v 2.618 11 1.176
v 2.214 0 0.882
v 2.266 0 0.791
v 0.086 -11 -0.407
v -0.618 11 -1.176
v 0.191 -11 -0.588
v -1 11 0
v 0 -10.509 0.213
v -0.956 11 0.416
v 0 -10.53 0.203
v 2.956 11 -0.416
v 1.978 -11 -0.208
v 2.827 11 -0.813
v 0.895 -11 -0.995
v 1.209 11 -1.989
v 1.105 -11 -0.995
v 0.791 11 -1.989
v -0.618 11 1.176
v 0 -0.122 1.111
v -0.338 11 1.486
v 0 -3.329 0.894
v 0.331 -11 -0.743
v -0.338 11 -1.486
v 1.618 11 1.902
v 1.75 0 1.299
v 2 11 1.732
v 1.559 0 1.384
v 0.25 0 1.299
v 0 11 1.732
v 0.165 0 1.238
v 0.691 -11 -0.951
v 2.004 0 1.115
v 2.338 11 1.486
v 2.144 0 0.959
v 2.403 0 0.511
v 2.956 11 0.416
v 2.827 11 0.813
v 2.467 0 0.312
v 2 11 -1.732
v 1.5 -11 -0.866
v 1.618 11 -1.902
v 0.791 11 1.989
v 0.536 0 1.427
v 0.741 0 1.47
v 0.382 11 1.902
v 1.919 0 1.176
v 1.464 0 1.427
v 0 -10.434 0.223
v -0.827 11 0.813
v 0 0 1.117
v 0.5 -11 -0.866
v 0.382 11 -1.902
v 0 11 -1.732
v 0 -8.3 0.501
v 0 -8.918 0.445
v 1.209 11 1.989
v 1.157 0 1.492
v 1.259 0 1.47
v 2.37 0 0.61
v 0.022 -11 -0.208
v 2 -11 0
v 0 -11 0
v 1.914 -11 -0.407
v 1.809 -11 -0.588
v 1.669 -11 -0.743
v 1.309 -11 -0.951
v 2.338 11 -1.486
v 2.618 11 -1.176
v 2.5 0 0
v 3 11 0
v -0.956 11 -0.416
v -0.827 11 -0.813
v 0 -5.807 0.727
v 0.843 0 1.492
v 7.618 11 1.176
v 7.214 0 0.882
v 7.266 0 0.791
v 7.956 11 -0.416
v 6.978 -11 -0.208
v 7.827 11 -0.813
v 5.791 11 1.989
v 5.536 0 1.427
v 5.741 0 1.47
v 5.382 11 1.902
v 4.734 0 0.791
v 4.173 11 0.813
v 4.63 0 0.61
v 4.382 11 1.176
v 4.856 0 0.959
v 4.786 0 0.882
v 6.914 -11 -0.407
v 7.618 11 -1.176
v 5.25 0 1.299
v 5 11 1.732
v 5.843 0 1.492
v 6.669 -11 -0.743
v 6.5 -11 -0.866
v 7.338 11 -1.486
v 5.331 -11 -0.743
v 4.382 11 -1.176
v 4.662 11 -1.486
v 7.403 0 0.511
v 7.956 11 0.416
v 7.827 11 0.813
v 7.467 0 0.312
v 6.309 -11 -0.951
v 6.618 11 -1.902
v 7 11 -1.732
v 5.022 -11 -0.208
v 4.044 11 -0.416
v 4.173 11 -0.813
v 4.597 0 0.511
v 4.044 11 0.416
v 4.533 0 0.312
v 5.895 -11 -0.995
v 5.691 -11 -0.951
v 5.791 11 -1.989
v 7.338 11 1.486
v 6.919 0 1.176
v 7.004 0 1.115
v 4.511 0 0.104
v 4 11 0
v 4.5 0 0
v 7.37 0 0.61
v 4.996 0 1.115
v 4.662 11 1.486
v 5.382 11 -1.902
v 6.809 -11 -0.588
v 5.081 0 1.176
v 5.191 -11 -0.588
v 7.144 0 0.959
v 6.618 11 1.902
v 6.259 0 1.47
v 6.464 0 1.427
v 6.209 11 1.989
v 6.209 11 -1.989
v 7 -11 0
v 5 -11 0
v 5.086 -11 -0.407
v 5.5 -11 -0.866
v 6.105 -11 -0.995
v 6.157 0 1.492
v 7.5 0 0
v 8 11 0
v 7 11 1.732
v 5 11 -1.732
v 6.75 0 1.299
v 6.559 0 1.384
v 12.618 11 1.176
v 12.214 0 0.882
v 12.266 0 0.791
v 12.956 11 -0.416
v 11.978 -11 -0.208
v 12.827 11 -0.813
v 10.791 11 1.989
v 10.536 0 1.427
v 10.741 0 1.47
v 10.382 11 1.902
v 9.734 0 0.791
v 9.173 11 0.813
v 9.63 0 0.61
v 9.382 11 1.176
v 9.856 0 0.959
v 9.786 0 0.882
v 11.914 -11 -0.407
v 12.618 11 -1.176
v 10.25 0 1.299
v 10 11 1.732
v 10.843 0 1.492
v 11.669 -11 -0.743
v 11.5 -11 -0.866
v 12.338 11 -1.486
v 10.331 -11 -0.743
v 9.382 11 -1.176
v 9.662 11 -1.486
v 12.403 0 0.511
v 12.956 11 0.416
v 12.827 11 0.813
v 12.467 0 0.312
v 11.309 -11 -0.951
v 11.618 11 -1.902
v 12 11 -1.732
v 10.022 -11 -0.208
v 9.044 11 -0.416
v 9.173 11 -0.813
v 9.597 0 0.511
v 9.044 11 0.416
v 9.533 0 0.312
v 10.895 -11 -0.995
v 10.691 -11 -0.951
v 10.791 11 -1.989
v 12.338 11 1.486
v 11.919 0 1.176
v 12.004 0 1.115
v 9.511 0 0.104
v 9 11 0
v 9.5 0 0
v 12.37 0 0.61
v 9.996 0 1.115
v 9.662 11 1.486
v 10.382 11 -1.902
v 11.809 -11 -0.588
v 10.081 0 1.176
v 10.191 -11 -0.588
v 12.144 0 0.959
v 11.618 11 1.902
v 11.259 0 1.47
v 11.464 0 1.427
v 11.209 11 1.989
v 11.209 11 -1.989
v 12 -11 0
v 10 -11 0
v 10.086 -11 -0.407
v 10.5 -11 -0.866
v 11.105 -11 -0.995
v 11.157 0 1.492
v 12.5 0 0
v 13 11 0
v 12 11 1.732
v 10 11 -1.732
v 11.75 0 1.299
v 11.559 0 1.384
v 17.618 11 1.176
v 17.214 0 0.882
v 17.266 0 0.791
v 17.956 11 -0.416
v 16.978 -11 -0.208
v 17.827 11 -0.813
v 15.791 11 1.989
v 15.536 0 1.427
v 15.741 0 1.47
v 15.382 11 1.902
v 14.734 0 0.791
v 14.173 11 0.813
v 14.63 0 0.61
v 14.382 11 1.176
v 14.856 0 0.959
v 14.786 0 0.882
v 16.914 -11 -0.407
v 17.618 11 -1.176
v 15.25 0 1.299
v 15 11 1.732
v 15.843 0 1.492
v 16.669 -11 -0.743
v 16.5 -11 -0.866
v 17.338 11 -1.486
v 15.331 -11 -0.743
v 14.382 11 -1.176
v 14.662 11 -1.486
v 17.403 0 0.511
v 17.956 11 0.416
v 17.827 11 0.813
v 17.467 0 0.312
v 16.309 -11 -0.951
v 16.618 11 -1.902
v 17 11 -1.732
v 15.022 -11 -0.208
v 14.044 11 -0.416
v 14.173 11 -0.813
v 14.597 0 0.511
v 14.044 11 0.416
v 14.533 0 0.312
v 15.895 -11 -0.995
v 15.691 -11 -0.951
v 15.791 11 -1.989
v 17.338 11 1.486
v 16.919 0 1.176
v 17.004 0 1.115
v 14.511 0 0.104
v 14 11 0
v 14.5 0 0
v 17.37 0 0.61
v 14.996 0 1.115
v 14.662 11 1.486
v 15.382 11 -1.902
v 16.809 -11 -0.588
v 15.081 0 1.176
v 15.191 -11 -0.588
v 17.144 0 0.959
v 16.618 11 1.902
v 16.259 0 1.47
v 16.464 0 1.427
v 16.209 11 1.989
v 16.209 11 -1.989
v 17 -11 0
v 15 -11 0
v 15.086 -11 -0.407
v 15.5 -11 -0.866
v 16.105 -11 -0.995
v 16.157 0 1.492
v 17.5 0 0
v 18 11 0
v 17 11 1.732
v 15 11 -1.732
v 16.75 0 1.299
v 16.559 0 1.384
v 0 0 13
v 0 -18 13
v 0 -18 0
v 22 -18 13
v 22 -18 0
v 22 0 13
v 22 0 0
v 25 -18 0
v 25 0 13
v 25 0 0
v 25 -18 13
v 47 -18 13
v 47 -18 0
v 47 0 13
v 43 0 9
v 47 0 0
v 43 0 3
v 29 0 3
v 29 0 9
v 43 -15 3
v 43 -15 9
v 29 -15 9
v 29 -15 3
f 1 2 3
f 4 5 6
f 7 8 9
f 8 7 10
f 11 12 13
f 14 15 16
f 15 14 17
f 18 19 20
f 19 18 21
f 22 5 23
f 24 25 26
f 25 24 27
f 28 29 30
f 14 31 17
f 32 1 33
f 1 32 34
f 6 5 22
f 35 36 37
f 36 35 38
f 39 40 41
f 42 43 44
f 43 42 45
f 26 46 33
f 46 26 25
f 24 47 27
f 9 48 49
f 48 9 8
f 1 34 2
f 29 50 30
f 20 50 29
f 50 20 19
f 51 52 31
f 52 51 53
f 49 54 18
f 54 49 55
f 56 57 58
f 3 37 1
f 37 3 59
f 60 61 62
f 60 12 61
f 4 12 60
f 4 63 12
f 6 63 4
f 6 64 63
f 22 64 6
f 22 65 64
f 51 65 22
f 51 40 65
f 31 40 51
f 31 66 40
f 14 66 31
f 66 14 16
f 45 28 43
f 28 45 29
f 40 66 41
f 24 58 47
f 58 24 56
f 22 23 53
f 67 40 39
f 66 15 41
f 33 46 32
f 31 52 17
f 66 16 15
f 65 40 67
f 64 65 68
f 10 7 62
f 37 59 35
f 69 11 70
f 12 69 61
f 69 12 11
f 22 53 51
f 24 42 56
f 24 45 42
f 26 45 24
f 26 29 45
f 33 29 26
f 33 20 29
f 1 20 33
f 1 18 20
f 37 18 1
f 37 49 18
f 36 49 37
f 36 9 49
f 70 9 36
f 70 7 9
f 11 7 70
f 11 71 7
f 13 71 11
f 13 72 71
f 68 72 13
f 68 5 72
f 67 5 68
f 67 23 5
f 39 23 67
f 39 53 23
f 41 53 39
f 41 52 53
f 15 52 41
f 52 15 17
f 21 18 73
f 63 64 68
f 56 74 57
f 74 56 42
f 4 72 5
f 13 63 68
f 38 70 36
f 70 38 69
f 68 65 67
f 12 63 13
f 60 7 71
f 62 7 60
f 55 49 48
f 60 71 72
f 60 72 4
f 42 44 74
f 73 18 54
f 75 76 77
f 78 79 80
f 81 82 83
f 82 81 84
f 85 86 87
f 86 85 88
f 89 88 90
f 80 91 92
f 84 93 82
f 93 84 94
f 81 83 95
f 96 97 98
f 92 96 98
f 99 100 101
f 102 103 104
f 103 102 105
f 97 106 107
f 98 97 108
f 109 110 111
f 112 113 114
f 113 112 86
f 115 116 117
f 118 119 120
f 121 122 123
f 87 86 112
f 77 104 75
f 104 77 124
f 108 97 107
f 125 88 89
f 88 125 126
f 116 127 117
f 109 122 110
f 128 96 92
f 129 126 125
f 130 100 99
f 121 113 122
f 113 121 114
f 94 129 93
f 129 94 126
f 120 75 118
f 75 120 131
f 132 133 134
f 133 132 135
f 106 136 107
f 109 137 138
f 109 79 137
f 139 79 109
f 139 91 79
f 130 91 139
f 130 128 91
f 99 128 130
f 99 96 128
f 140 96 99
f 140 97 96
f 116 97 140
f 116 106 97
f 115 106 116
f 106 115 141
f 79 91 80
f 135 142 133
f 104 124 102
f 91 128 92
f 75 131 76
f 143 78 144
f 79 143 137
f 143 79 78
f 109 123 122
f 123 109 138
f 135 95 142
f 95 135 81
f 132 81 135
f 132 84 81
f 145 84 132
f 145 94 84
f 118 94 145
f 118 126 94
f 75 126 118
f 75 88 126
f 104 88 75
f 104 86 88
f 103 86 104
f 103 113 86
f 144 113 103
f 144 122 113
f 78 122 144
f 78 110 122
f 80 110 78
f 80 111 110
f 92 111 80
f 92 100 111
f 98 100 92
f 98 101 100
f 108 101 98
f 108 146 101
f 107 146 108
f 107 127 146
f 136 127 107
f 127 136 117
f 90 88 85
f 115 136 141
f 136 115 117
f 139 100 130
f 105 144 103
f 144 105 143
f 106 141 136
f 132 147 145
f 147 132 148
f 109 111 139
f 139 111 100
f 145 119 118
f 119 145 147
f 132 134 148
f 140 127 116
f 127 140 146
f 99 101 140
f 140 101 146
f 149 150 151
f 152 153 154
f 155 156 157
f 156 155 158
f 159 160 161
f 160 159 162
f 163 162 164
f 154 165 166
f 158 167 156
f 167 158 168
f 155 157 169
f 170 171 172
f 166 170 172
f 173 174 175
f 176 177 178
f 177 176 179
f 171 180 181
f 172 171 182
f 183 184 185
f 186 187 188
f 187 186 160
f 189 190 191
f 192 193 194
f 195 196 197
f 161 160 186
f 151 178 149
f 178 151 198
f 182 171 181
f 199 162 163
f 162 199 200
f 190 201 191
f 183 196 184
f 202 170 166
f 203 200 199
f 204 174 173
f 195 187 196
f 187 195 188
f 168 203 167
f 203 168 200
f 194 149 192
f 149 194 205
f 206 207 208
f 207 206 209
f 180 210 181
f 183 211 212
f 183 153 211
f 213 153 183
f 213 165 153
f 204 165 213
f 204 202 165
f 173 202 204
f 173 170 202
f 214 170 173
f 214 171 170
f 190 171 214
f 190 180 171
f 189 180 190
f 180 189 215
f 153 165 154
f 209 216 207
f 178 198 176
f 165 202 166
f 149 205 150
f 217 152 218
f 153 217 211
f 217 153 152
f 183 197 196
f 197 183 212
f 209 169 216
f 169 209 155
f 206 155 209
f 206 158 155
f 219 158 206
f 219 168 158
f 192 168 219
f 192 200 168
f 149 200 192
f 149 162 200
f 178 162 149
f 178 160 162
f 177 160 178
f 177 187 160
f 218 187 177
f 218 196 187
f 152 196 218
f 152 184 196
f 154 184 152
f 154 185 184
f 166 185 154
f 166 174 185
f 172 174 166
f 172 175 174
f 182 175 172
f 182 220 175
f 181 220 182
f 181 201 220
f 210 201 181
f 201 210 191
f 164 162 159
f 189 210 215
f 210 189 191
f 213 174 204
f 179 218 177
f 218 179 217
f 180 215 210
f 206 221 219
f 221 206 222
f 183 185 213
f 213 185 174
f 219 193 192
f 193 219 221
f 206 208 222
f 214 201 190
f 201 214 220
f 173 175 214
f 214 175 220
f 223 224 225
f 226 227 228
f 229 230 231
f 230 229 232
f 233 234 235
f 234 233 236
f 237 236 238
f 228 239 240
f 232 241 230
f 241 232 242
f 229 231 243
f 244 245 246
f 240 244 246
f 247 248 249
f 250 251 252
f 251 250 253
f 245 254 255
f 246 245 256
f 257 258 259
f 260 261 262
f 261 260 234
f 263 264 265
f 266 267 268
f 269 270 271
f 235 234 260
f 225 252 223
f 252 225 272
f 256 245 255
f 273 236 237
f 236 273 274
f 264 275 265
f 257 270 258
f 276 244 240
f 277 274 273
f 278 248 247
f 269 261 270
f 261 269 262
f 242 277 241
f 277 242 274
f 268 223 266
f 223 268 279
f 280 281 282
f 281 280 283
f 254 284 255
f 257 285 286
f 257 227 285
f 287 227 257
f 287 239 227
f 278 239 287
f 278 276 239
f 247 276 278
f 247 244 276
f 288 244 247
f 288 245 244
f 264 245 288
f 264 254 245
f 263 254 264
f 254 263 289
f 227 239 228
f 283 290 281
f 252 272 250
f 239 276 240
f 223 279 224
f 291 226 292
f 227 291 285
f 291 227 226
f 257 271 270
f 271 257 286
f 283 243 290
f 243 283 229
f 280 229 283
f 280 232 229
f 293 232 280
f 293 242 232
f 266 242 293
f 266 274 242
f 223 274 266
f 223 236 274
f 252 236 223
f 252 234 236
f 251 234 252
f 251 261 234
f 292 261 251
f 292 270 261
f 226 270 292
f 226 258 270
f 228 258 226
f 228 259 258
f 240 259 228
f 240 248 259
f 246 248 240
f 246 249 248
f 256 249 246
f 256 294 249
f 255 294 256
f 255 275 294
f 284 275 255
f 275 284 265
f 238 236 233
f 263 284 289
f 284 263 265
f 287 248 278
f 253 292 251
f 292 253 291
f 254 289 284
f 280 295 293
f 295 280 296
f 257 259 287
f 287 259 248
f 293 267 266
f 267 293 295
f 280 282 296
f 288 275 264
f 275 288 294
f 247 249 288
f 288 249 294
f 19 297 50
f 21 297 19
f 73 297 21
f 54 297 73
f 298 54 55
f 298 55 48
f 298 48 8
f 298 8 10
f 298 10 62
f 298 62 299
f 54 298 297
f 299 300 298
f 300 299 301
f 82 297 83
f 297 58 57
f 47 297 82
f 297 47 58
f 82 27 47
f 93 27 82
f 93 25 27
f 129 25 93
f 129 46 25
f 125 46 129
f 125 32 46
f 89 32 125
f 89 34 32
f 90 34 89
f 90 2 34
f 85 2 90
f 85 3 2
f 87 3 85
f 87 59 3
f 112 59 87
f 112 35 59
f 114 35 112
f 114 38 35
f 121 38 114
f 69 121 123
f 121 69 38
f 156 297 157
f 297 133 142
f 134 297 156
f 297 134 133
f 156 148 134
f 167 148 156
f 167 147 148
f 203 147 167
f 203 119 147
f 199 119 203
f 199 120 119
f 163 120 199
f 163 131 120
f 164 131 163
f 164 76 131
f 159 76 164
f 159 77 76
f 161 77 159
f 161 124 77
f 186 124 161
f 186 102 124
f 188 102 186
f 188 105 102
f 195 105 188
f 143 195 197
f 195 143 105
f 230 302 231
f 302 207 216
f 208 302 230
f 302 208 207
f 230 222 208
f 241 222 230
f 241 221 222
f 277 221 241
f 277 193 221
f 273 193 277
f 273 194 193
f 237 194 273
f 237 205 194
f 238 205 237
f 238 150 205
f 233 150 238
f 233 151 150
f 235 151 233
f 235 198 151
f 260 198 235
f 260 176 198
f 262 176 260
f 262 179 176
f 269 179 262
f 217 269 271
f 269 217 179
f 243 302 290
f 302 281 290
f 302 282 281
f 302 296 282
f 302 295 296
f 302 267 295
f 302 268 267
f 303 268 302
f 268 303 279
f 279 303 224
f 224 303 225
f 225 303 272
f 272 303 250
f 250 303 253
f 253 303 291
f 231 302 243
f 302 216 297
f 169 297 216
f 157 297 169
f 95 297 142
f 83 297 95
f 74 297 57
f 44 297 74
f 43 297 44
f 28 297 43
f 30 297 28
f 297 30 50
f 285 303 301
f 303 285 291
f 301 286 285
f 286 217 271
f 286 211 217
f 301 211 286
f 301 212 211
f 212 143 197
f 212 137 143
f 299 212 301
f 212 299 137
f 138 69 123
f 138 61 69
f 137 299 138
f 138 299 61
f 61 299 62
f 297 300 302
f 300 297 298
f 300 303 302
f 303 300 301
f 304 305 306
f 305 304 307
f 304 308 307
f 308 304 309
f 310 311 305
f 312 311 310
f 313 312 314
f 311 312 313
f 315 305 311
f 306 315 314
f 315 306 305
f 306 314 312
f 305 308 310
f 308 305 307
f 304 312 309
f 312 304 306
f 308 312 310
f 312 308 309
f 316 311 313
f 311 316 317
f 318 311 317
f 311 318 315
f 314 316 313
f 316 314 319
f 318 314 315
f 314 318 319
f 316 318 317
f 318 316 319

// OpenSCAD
/*

__________ ____ ___  _____________  __.___.____    .____     
\______   \    |   \/   _____/    |/ _|   |    |   |    |    
 |    |  _/    |   /\_____  \|      < |   |    |   |    |    
 |    |   \    |  / /        \    |  \|   |    |___|    |___ 
 |______  /______/ /_______  /____|__ \___|_______ \_______ \
        \/                 \/        \/           \/       \/


*/
/*                      
Buskill USB-A Magnetic breakaway Shell Assembly     
GNU General Public License v3.0 
Author: Melanie Allen
*/



/*
Description

BusKill is a Dead Man Switch triggered when a magnetic breakaway is tripped, severing a USB connection. This design is for USB-A.

The user will have a USB, a USB extension cable, and the magnetic breakaway. 

The "breakaway" is connected to a USB extension cord that terminates with the female USB port that receives a USB. It is in four parts, the base, two middle pieces, and the lid. It contains 5 pogo pins and 2 magnets. It separates from the release when the cord is pulled. (red)

The "release" is connected to the cord that terminates with the male USB and inserts the computer. It is in three parts, the base, the middle, and the lid. It contains 5 pogo receptors and 2 magnets. (pink)

When the magnets on the breakaway and release connect, the pogo pins and pogo receptors must meet and establish the USB connection.

The breakaway and release plugs must be designed asymmetrically to prevent the connection from happening the wrong way. 

In this version I have borrowed these mangets and pogo receptors from the Supplier verison of the BusKill cable.

docs.buskill.in
buskill.in
*/



//magnet variables

//USB_port variables
u_h = 14;
u_w = 15;
u_d = 6;

//pogo variables

pogo_length=22;
pogo_diameter=2;
pogo_distance=5; //distance between pins 
shift=1; //distance from pins 

//receptor variables

//breakaway variables
i_h = 22; //x
i_w = 13; //z
i_d = 18; //y

//release variables
i_l_h =i_h; //x
i_l_w = i_w; //z
i_l_d = 18; //y

//pogo pins

module pogos(){
        translate([shift,0,0])rotate ([90,0,0])cylinder($fn = 30, $fa = 30, $fs = 2, h=pogo_length, r1=pogo_diameter, r2=pogo_diameter-1, center = true);
    translate([pogo_distance+shift,0,0])rotate ([90,0,0])cylinder($fn = 30, $fa = 30, $fs = 1.8, h=pogo_length, r1=pogo_diameter, r2=pogo_diameter-1, center = true);
            translate([pogo_distance*2+shift,0,0])rotate ([90,0,0])cylinder($fn = 30, $fa = 30, $fs = 2, h=pogo_length, r1=pogo_diameter, r2=pogo_diameter-1, center = true);
    translate([pogo_distance*3+shift,0,0])rotate ([90,0,0])cylinder($fn = 30, $fa = 30, $fs = 1.8, h=pogo_length, r1=pogo_diameter, r2=pogo_diameter-1, center = true);
}

pogos();

//pogo receptors

module recs(){

}

//recs();

module magnet(){
    
}

//magnet();

//

module void(){

}

//

module void2(){

}


/* * Blocks * */
    module top_block(){
    color("Red",.55)
 rotate([90,0,0]){
{
                cube(size = [i_l_h, i_l_w, i_l_d], center = false);
            }
        } 
    } 
   // top_block();

block_distance=25;    
        module base_block(){
    color("Pink",.55)
 rotate([90,0,0]){
            translate([block_distance,0,0]){
                cube(size = [i_h, i_w, i_d], center = false);
            }
        } 
    } 
  //base_block();

    
difference(){
       top_block();
    translate([3,-i_l_d,3])void();
    translate([3,-i_l_d,9])void();

}

translate([0,0,0])difference(){
      base_block();
    translate([3+block_distance,-i_d,3])void2();
    translate([3+block_distance,-i_d,9])void2();
    translate([4+block_distance,-15,3])
cube(size=[u_h,u_w,u_d], center = false);
}
